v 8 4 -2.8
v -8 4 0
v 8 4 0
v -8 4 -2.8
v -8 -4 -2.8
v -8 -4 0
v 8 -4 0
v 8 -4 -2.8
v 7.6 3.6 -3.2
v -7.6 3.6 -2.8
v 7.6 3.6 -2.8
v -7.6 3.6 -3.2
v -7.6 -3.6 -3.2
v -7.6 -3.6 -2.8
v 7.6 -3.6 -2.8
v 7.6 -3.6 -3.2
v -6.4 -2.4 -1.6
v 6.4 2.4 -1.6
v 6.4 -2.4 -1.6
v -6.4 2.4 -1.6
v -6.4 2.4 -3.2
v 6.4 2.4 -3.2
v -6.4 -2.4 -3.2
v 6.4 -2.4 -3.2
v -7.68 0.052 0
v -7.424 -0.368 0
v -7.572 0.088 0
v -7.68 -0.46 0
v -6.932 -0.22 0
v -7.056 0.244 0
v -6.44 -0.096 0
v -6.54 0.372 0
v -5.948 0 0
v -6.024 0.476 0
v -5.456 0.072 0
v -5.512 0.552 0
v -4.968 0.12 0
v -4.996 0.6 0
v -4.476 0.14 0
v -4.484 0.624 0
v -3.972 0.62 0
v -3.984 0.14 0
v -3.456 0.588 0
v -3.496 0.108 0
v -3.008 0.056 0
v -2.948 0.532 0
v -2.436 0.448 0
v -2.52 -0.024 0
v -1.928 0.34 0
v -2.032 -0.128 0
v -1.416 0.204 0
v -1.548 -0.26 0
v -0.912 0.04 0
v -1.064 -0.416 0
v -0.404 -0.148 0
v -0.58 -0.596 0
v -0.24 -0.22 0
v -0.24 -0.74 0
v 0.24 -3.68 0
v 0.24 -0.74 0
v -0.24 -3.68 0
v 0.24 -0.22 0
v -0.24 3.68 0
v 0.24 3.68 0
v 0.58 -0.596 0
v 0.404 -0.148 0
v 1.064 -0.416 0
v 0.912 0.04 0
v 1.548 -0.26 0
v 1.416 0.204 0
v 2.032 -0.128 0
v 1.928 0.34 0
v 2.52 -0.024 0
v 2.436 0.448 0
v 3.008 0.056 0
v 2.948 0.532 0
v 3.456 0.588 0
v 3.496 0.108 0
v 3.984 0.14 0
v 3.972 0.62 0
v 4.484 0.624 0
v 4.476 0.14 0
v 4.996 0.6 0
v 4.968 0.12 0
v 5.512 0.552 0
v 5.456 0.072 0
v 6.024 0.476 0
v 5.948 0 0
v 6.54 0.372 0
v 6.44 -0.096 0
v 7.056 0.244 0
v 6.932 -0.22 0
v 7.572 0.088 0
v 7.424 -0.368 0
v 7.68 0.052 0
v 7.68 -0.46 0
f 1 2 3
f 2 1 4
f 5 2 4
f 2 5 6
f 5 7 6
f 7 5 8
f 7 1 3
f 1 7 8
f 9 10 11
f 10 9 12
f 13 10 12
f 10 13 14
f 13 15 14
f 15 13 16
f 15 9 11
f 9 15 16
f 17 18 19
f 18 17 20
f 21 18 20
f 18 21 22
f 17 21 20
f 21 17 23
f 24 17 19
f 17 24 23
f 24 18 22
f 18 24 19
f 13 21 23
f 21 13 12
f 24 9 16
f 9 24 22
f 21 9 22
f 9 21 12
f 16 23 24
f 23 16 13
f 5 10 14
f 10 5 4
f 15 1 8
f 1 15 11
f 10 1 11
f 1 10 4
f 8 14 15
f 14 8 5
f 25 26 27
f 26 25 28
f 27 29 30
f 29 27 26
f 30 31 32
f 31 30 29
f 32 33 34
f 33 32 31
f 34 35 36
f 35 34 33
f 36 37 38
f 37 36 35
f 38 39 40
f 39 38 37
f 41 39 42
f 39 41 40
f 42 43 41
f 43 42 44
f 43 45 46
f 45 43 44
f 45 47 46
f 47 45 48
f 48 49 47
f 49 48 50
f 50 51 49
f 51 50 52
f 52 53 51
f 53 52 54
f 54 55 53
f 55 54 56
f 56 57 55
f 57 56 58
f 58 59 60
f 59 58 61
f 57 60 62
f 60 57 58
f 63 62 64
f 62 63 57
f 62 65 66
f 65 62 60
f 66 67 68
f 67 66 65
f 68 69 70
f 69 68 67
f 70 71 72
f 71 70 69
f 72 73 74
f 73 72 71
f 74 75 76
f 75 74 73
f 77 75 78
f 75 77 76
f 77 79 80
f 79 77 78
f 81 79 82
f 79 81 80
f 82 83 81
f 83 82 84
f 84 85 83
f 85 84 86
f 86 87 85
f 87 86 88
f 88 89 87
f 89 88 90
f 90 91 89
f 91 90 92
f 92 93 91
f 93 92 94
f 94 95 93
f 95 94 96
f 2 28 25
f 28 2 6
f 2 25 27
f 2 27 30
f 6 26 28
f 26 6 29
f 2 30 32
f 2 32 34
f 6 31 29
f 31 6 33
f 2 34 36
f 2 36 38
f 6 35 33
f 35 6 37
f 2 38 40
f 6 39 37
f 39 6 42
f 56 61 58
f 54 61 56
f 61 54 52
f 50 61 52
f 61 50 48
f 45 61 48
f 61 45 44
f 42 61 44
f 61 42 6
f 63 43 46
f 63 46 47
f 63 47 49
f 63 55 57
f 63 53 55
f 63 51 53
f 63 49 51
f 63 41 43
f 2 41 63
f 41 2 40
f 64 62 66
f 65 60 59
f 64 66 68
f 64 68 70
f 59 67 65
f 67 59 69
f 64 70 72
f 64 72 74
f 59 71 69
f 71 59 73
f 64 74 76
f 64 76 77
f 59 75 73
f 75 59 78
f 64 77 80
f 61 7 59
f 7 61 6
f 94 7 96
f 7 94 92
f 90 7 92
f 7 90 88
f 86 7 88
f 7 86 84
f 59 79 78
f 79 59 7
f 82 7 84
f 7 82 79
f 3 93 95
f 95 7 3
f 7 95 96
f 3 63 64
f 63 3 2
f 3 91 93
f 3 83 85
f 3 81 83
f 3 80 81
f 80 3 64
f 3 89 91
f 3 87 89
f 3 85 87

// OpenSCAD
// file: ../p/box5.scad
use <../lib.scad>
function ldraw_lib__box5() = [
// 0 Box with 5 Faces and All Edges
// 0 Name: box5.dat
// 0 Author: James Jessiman
// 0 !LDRAW_ORG Primitive UPDATE 2012-01
// 0 !LICENSE Licensed under CC BY 2.0 and CC BY 4.0 : see CAreadme.txt
// 
// 0 BFC CERTIFY CCW
  [0,"BFC","CERTIFY"],
  [0,"BFC","CCW"],
// 
// 0 !HISTORY 2002-04-03 [sbliss] Modified for BFC compliance
// 0 !HISTORY 2002-04-25 [PTadmin] Official Update 2002-02
// 0 !HISTORY 2007-06-24 [PTadmin] Header formatted for Contributor Agreement
// 0 !HISTORY 2008-07-01 [PTadmin] Official Update 2008-01
// 0 !HISTORY 2012-02-16 [Philo] Changed to CCW
// 0 !HISTORY 2012-03-30 [PTadmin] Official Update 2012-01
// 
// 
// 2 24 1 1 1 -1 1 1
  [2,24,1,1,1,-1,1,1],
// 2 24 -1 1 1 -1 1 -1
  [2,24,-1,1,1,-1,1,-1],
// 2 24 -1 1 -1 1 1 -1
  [2,24,-1,1,-1,1,1,-1],
// 2 24 1 1 -1 1 1 1
  [2,24,1,1,-1,1,1,1],
// 2 24 1 0 1 -1 0 1
  [2,24,1,0,1,-1,0,1],
// 2 24 -1 0 1 -1 0 -1
  [2,24,-1,0,1,-1,0,-1],
// 2 24 -1 0 -1 1 0 -1
  [2,24,-1,0,-1,1,0,-1],
// 2 24 1 0 -1 1 0 1
  [2,24,1,0,-1,1,0,1],
// 2 24 1 0 1 1 1 1
  [2,24,1,0,1,1,1,1],
// 2 24 -1 0 1 -1 1 1
  [2,24,-1,0,1,-1,1,1],
// 2 24 1 0 -1 1 1 -1
  [2,24,1,0,-1,1,1,-1],
// 2 24 -1 0 -1 -1 1 -1
  [2,24,-1,0,-1,-1,1,-1],
// 4 16 -1 1 1 1 1 1 1 1 -1 -1 1 -1
  [4,16,-1,1,1,1,1,1,1,1,-1,-1,1,-1],
// 4 16 -1 1 1 -1 0 1 1 0 1 1 1 1
  [4,16,-1,1,1,-1,0,1,1,0,1,1,1,1],
// 4 16 -1 1 -1 -1 0 -1 -1 0 1 -1 1 1
  [4,16,-1,1,-1,-1,0,-1,-1,0,1,-1,1,1],
// 4 16 1 1 -1 1 0 -1 -1 0 -1 -1 1 -1
  [4,16,1,1,-1,1,0,-1,-1,0,-1,-1,1,-1],
// 4 16 1 1 1 1 0 1 1 0 -1 1 1 -1
  [4,16,1,1,1,1,0,1,1,0,-1,1,1,-1],
];
makepoly(ldraw_lib__box5(), line=0.2);
// file: ../p/box4.scad
use <../lib.scad>
function ldraw_lib__box4() = [
// 0 Box with 4 Faces (2 Parallel Pairs) and All Edges
// 0 Name: box4.dat
// 0 Author: James Jessiman
// 0 !LDRAW_ORG Primitive UPDATE 2012-01
// 0 !LICENSE Licensed under CC BY 2.0 and CC BY 4.0 : see CAreadme.txt
// 
// 0 BFC CERTIFY CCW
  [0,"BFC","CERTIFY"],
  [0,"BFC","CCW"],
// 
// 0 !HISTORY 2002-04-03 [sbliss] Modified for BFC compliance
// 0 !HISTORY 2002-04-25 [PTadmin] Official Update 2002-02
// 0 !HISTORY 2007-06-24 [PTadmin] Header formatted for Contributor Agreement
// 0 !HISTORY 2008-07-01 [PTadmin] Official Update 2008-01
// 0 !HISTORY 2012-02-16 [Philo] Changed to CCW
// 0 !HISTORY 2012-03-30 [PTadmin] Official Update 2012-01
// 
// 
// 2 24 1 1 1 -1 1 1
  [2,24,1,1,1,-1,1,1],
// 2 24 -1 1 1 -1 1 -1
  [2,24,-1,1,1,-1,1,-1],
// 2 24 -1 1 -1 1 1 -1
  [2,24,-1,1,-1,1,1,-1],
// 2 24 1 1 -1 1 1 1
  [2,24,1,1,-1,1,1,1],
// 2 24 1 0 1 -1 0 1
  [2,24,1,0,1,-1,0,1],
// 2 24 -1 0 1 -1 0 -1
  [2,24,-1,0,1,-1,0,-1],
// 2 24 -1 0 -1 1 0 -1
  [2,24,-1,0,-1,1,0,-1],
// 2 24 1 0 -1 1 0 1
  [2,24,1,0,-1,1,0,1],
// 2 24 1 0 1 1 1 1
  [2,24,1,0,1,1,1,1],
// 2 24 -1 0 1 -1 1 1
  [2,24,-1,0,1,-1,1,1],
// 2 24 1 0 -1 1 1 -1
  [2,24,1,0,-1,1,1,-1],
// 2 24 -1 0 -1 -1 1 -1
  [2,24,-1,0,-1,-1,1,-1],
// 4 16 -1 1 1 -1 0 1 1 0 1 1 1 1
  [4,16,-1,1,1,-1,0,1,1,0,1,1,1,1],
// 4 16 -1 1 -1 -1 0 -1 -1 0 1 -1 1 1
  [4,16,-1,1,-1,-1,0,-1,-1,0,1,-1,1,1],
// 4 16 1 1 -1 1 0 -1 -1 0 -1 -1 1 -1
  [4,16,1,1,-1,1,0,-1,-1,0,-1,-1,1,-1],
// 4 16 1 1 1 1 0 1 1 0 -1 1 1 -1
  [4,16,1,1,1,1,0,1,1,0,-1,1,1,-1],
];
makepoly(ldraw_lib__box4(), line=0.2);
// file: s/3069bs01.scad
use <../../lib.scad>
use <../../p/box4.scad>
use <../../p/box5.scad>
function ldraw_lib__s__3069bs01() = [
// 0 ~Tile  1 x  2 with Groove without Top Face
// 0 Name: s\3069bs01.dat
// 0 Author: Santeri Piippo [arezey]
// 0 !LDRAW_ORG Subpart UPDATE 2010-02
// 0 !LICENSE Licensed under CC BY 2.0 and CC BY 4.0 : see CAreadme.txt
// 
// 0 BFC CERTIFY CCW
  [0,"BFC","CERTIFY"],
  [0,"BFC","CCW"],
// 
// 0 !HISTORY 2010-07-05 [PTadmin] Official Update 2010-02
// 
// 
// 1 16 0 0 0 20 0 0 0 7 0 0 0 10 box4.dat
  [1,16,0,0,0,20,0,0,0,7,0,0,0,10, ldraw_lib__box4()],
// 1 16 0 7 0 19 0 0 0 1 0 0 0 9 box4.dat
  [1,16,0,7,0,19,0,0,0,1,0,0,0,9, ldraw_lib__box4()],
// 0 BFC INVERTNEXT
  [0,"BFC","INVERTNEXT"],
// 1 16 0 8 0 16 0 0 0 -4 0 0 0 6 box5.dat
  [1,16,0,8,0,16,0,0,0,-4,0,0,0,6, ldraw_lib__box5()],
// 4 16 -19 8 9 -16 8 6 -16 8 -6 -19 8 -9
  [4,16,-19,8,9,-16,8,6,-16,8,-6,-19,8,-9],
// 4 16 19 8 -9 16 8 -6 16 8 6 19 8 9
  [4,16,19,8,-9,16,8,-6,16,8,6,19,8,9],
// 4 16 19 8 9 16 8 6 -16 8 6 -19 8 9
  [4,16,19,8,9,16,8,6,-16,8,6,-19,8,9],
// 4 16 -19 8 -9 -16 8 -6 16 8 -6 19 8 -9
  [4,16,-19,8,-9,-16,8,-6,16,8,-6,19,8,-9],
// 4 16 -20 7 10 -19 7 9 -19 7 -9 -20 7 -10
  [4,16,-20,7,10,-19,7,9,-19,7,-9,-20,7,-10],
// 4 16 20 7 -10 19 7 -9 19 7 9 20 7 10
  [4,16,20,7,-10,19,7,-9,19,7,9,20,7,10],
// 4 16 20 7 10 19 7 9 -19 7 9 -20 7 10
  [4,16,20,7,10,19,7,9,-19,7,9,-20,7,10],
// 4 16 -20 7 -10 -19 7 -9 19 7 -9 20 7 -10
  [4,16,-20,7,-10,-19,7,-9,19,7,-9,20,7,-10],
// 0 //
];
makepoly(ldraw_lib__s__3069bs01(), line=0.2);
// main file
use <../lib.scad>
use <s/3069bs01.scad>
function ldraw_lib__3069bpz9() = [
// 0 Tile  1 x  2 with Black Spider Web Pattern
// 0 Name: 3069bpz9.dat
// 0 Author: Damien Roux [Darats]
// 0 !LDRAW_ORG Part UPDATE 2019-01
// 0 !LICENSE Licensed under CC BY 2.0 and CC BY 4.0 : see CAreadme.txt
// 
// 0 BFC CERTIFY CCW
  [0,"BFC","CERTIFY"],
  [0,"BFC","CCW"],
// 
// 0 !KEYWORDS Brickheadz, Set 41497, Spider-Man
// 
// 0 !HISTORY 2019-06-28 [PTadmin] Official Update 2019-01
// 
// 
// 1 16 0 0 0 1 0 0 0 1 0 0 0 1 s\3069bs01.dat
  [1,16,0,0,0,1,0,0,0,1,0,0,0,1, ldraw_lib__s__3069bs01()],
// 4 0 -18.93 0 0.22 -19.2 0 0.13 -19.2 0 -1.15 -18.56 0 -0.92
  [4,0,-18.93,0,0.22,-19.2,0,0.13,-19.2,0,-1.15,-18.56,0,-0.92],
// 4 0 -17.64 0 0.61 -18.93 0 0.22 -18.56 0 -0.92 -17.33 0 -0.55
  [4,0,-17.64,0,0.61,-18.93,0,0.22,-18.56,0,-0.92,-17.33,0,-0.55],
// 4 0 -16.35 0 0.93 -17.64 0 0.61 -17.33 0 -0.55 -16.1 0 -0.24
  [4,0,-16.35,0,0.93,-17.64,0,0.61,-17.33,0,-0.55,-16.1,0,-0.24],
// 4 0 -15.06 0 1.19 -16.35 0 0.93 -16.1 0 -0.24 -14.87 0 0
  [4,0,-15.06,0,1.19,-16.35,0,0.93,-16.1,0,-0.24,-14.87,0,0],
// 4 0 -13.78 0 1.38 -15.06 0 1.19 -14.87 0 0 -13.64 0 0.18
  [4,0,-13.78,0,1.38,-15.06,0,1.19,-14.87,0,0,-13.64,0,0.18],
// 4 0 -12.49 0 1.5 -13.78 0 1.38 -13.64 0 0.18 -12.42 0 0.3
  [4,0,-12.49,0,1.5,-13.78,0,1.38,-13.64,0,0.18,-12.42,0,0.3],
// 4 0 -11.21 0 1.56 -12.49 0 1.5 -12.42 0 0.3 -11.19 0 0.35
  [4,0,-11.21,0,1.56,-12.49,0,1.5,-12.42,0,0.3,-11.19,0,0.35],
// 4 0 -9.93 0 1.55 -11.21 0 1.56 -11.19 0 0.35 -9.96 0 0.35
  [4,0,-9.93,0,1.55,-11.21,0,1.56,-11.19,0,0.35,-9.96,0,0.35],
// 4 0 -8.64 0 1.47 -9.93 0 1.55 -9.96 0 0.35 -8.74 0 0.27
  [4,0,-8.64,0,1.47,-9.93,0,1.55,-9.96,0,0.35,-8.74,0,0.27],
// 4 0 -7.37 0 1.33 -8.64 0 1.47 -8.74 0 0.27 -7.52 0 0.14
  [4,0,-7.37,0,1.33,-8.64,0,1.47,-8.74,0,0.27,-7.52,0,0.14],
// 4 0 -6.09 0 1.12 -7.37 0 1.33 -7.52 0 0.14 -6.3 0 -0.06
  [4,0,-6.09,0,1.12,-7.37,0,1.33,-7.52,0,0.14,-6.3,0,-0.06],
// 4 0 -4.82 0 0.85 -6.09 0 1.12 -6.3 0 -0.06 -5.08 0 -0.32
  [4,0,-4.82,0,0.85,-6.09,0,1.12,-6.3,0,-0.06,-5.08,0,-0.32],
// 4 0 -3.54 0 0.51 -4.82 0 0.85 -5.08 0 -0.32 -3.87 0 -0.65
  [4,0,-3.54,0,0.51,-4.82,0,0.85,-5.08,0,-0.32,-3.87,0,-0.65],
// 4 0 -2.28 0 0.1 -3.54 0 0.51 -3.87 0 -0.65 -2.66 0 -1.04
  [4,0,-2.28,0,0.1,-3.54,0,0.51,-3.87,0,-0.65,-2.66,0,-1.04],
// 4 0 -1.01 0 -0.37 -2.28 0 0.1 -2.66 0 -1.04 -1.45 0 -1.49
  [4,0,-1.01,0,-0.37,-2.28,0,0.1,-2.66,0,-1.04,-1.45,0,-1.49],
// 4 0 -0.6 0 -0.55 -1.01 0 -0.37 -1.45 0 -1.49 -0.6 0 -1.85
  [4,0,-0.6,0,-0.55,-1.01,0,-0.37,-1.45,0,-1.49,-0.6,0,-1.85],
// 4 0 0.6 0 -1.85 -0.6 0 -1.85 -0.6 0 -9.2 0.6 0 -9.2
  [4,0,0.6,0,-1.85,-0.6,0,-1.85,-0.6,0,-9.2,0.6,0,-9.2],
// 4 0 0.6 0 -0.55 -0.6 0 -0.55 -0.6 0 -1.85 0.6 0 -1.85
  [4,0,0.6,0,-0.55,-0.6,0,-0.55,-0.6,0,-1.85,0.6,0,-1.85],
// 4 0 0.6 0 9.2 -0.6 0 9.2 -0.6 0 -0.55 0.6 0 -0.55
  [4,0,0.6,0,9.2,-0.6,0,9.2,-0.6,0,-0.55,0.6,0,-0.55],
// 4 0 1.45 0 -1.49 1.01 0 -0.37 0.6 0 -0.55 0.6 0 -1.85
  [4,0,1.45,0,-1.49,1.01,0,-0.37,0.6,0,-0.55,0.6,0,-1.85],
// 4 0 2.66 0 -1.04 2.28 0 0.1 1.01 0 -0.37 1.45 0 -1.49
  [4,0,2.66,0,-1.04,2.28,0,0.1,1.01,0,-0.37,1.45,0,-1.49],
// 4 0 3.87 0 -0.65 3.54 0 0.51 2.28 0 0.1 2.66 0 -1.04
  [4,0,3.87,0,-0.65,3.54,0,0.51,2.28,0,0.1,2.66,0,-1.04],
// 4 0 5.08 0 -0.32 4.82 0 0.85 3.54 0 0.51 3.87 0 -0.65
  [4,0,5.08,0,-0.32,4.82,0,0.85,3.54,0,0.51,3.87,0,-0.65],
// 4 0 6.3 0 -0.06 6.09 0 1.12 4.82 0 0.85 5.08 0 -0.32
  [4,0,6.3,0,-0.06,6.09,0,1.12,4.82,0,0.85,5.08,0,-0.32],
// 4 0 7.52 0 0.14 7.37 0 1.33 6.09 0 1.12 6.3 0 -0.06
  [4,0,7.52,0,0.14,7.37,0,1.33,6.09,0,1.12,6.3,0,-0.06],
// 4 0 8.74 0 0.27 8.64 0 1.47 7.37 0 1.33 7.52 0 0.14
  [4,0,8.74,0,0.27,8.64,0,1.47,7.37,0,1.33,7.52,0,0.14],
// 4 0 9.96 0 0.35 9.93 0 1.55 8.64 0 1.47 8.74 0 0.27
  [4,0,9.96,0,0.35,9.93,0,1.55,8.64,0,1.47,8.74,0,0.27],
// 4 0 11.19 0 0.35 11.21 0 1.56 9.93 0 1.55 9.96 0 0.35
  [4,0,11.19,0,0.35,11.21,0,1.56,9.93,0,1.55,9.96,0,0.35],
// 4 0 12.42 0 0.3 12.49 0 1.5 11.21 0 1.56 11.19 0 0.35
  [4,0,12.42,0,0.3,12.49,0,1.5,11.21,0,1.56,11.19,0,0.35],
// 4 0 13.64 0 0.18 13.78 0 1.38 12.49 0 1.5 12.42 0 0.3
  [4,0,13.64,0,0.18,13.78,0,1.38,12.49,0,1.5,12.42,0,0.3],
// 4 0 14.87 0 0 15.06 0 1.19 13.78 0 1.38 13.64 0 0.18
  [4,0,14.87,0,0,15.06,0,1.19,13.78,0,1.38,13.64,0,0.18],
// 4 0 16.1 0 -0.24 16.35 0 0.93 15.06 0 1.19 14.87 0 0
  [4,0,16.1,0,-0.24,16.35,0,0.93,15.06,0,1.19,14.87,0,0],
// 4 0 17.33 0 -0.55 17.64 0 0.61 16.35 0 0.93 16.1 0 -0.24
  [4,0,17.33,0,-0.55,17.64,0,0.61,16.35,0,0.93,16.1,0,-0.24],
// 4 0 18.56 0 -0.92 18.93 0 0.22 17.64 0 0.61 17.33 0 -0.55
  [4,0,18.56,0,-0.92,18.93,0,0.22,17.64,0,0.61,17.33,0,-0.55],
// 4 0 19.2 0 -1.15 19.2 0 0.13 18.93 0 0.22 18.56 0 -0.92
  [4,0,19.2,0,-1.15,19.2,0,0.13,18.93,0,0.22,18.56,0,-0.92],
// 4 16 -19.2 0 0.13 -20 0 10 -20 0 -10 -19.2 0 -1.15
  [4,16,-19.2,0,0.13,-20,0,10,-20,0,-10,-19.2,0,-1.15],
// 3 16 -20 0 10 -19.2 0 0.13 -18.93 0 0.22
  [3,16,-20,0,10,-19.2,0,0.13,-18.93,0,0.22],
// 3 16 -20 0 10 -18.93 0 0.22 -17.64 0 0.61
  [3,16,-20,0,10,-18.93,0,0.22,-17.64,0,0.61],
// 4 16 -18.56 0 -0.92 -19.2 0 -1.15 -20 0 -10 -17.33 0 -0.55
  [4,16,-18.56,0,-0.92,-19.2,0,-1.15,-20,0,-10,-17.33,0,-0.55],
// 3 16 -20 0 10 -17.64 0 0.61 -16.35 0 0.93
  [3,16,-20,0,10,-17.64,0,0.61,-16.35,0,0.93],
// 3 16 -20 0 10 -16.35 0 0.93 -15.06 0 1.19
  [3,16,-20,0,10,-16.35,0,0.93,-15.06,0,1.19],
// 4 16 -16.1 0 -0.24 -17.33 0 -0.55 -20 0 -10 -14.87 0 0
  [4,16,-16.1,0,-0.24,-17.33,0,-0.55,-20,0,-10,-14.87,0,0],
// 3 16 -20 0 10 -15.06 0 1.19 -13.78 0 1.38
  [3,16,-20,0,10,-15.06,0,1.19,-13.78,0,1.38],
// 3 16 -20 0 10 -13.78 0 1.38 -12.49 0 1.5
  [3,16,-20,0,10,-13.78,0,1.38,-12.49,0,1.5],
// 4 16 -13.64 0 0.18 -14.87 0 0 -20 0 -10 -12.42 0 0.3
  [4,16,-13.64,0,0.18,-14.87,0,0,-20,0,-10,-12.42,0,0.3],
// 3 16 -20 0 10 -12.49 0 1.5 -11.21 0 1.56
  [3,16,-20,0,10,-12.49,0,1.5,-11.21,0,1.56],
// 4 16 -11.19 0 0.35 -12.42 0 0.3 -20 0 -10 -9.96 0 0.35
  [4,16,-11.19,0,0.35,-12.42,0,0.3,-20,0,-10,-9.96,0,0.35],
// 3 16 -1.45 0 -1.49 -0.6 0 -9.2 -0.6 0 -1.85
  [3,16,-1.45,0,-1.49,-0.6,0,-9.2,-0.6,0,-1.85],
// 4 16 -2.66 0 -1.04 -3.87 0 -0.65 -0.6 0 -9.2 -1.45 0 -1.49
  [4,16,-2.66,0,-1.04,-3.87,0,-0.65,-0.6,0,-9.2,-1.45,0,-1.49],
// 4 16 -5.08 0 -0.32 -6.3 0 -0.06 -0.6 0 -9.2 -3.87 0 -0.65
  [4,16,-5.08,0,-0.32,-6.3,0,-0.06,-0.6,0,-9.2,-3.87,0,-0.65],
// 4 16 -7.52 0 0.14 -8.74 0 0.27 -0.6 0 -9.2 -6.3 0 -0.06
  [4,16,-7.52,0,0.14,-8.74,0,0.27,-0.6,0,-9.2,-6.3,0,-0.06],
// 4 16 -9.96 0 0.35 -20 0 -10 -0.6 0 -9.2 -8.74 0 0.27
  [4,16,-9.96,0,0.35,-20,0,-10,-0.6,0,-9.2,-8.74,0,0.27],
// 3 16 -0.6 0 9.2 -8.64 0 1.47 -7.37 0 1.33
  [3,16,-0.6,0,9.2,-8.64,0,1.47,-7.37,0,1.33],
// 3 16 -0.6 0 9.2 -7.37 0 1.33 -6.09 0 1.12
  [3,16,-0.6,0,9.2,-7.37,0,1.33,-6.09,0,1.12],
// 3 16 -0.6 0 9.2 -6.09 0 1.12 -4.82 0 0.85
  [3,16,-0.6,0,9.2,-6.09,0,1.12,-4.82,0,0.85],
// 3 16 -0.6 0 9.2 -1.01 0 -0.37 -0.6 0 -0.55
  [3,16,-0.6,0,9.2,-1.01,0,-0.37,-0.6,0,-0.55],
// 3 16 -0.6 0 9.2 -2.28 0 0.1 -1.01 0 -0.37
  [3,16,-0.6,0,9.2,-2.28,0,0.1,-1.01,0,-0.37],
// 3 16 -0.6 0 9.2 -3.54 0 0.51 -2.28 0 0.1
  [3,16,-0.6,0,9.2,-3.54,0,0.51,-2.28,0,0.1],
// 3 16 -0.6 0 9.2 -4.82 0 0.85 -3.54 0 0.51
  [3,16,-0.6,0,9.2,-4.82,0,0.85,-3.54,0,0.51],
// 3 16 -0.6 0 9.2 -9.93 0 1.55 -8.64 0 1.47
  [3,16,-0.6,0,9.2,-9.93,0,1.55,-8.64,0,1.47],
// 4 16 -20 0 10 -11.21 0 1.56 -9.93 0 1.55 -0.6 0 9.2
  [4,16,-20,0,10,-11.21,0,1.56,-9.93,0,1.55,-0.6,0,9.2],
// 3 16 0.6 0 9.2 0.6 0 -0.55 1.01 0 -0.37
  [3,16,0.6,0,9.2,0.6,0,-0.55,1.01,0,-0.37],
// 3 16 1.45 0 -1.49 0.6 0 -1.85 0.6 0 -9.2
  [3,16,1.45,0,-1.49,0.6,0,-1.85,0.6,0,-9.2],
// 3 16 0.6 0 9.2 1.01 0 -0.37 2.28 0 0.1
  [3,16,0.6,0,9.2,1.01,0,-0.37,2.28,0,0.1],
// 3 16 0.6 0 9.2 2.28 0 0.1 3.54 0 0.51
  [3,16,0.6,0,9.2,2.28,0,0.1,3.54,0,0.51],
// 4 16 0.6 0 -9.2 3.87 0 -0.65 2.66 0 -1.04 1.45 0 -1.49
  [4,16,0.6,0,-9.2,3.87,0,-0.65,2.66,0,-1.04,1.45,0,-1.49],
// 3 16 0.6 0 9.2 3.54 0 0.51 4.82 0 0.85
  [3,16,0.6,0,9.2,3.54,0,0.51,4.82,0,0.85],
// 3 16 0.6 0 9.2 4.82 0 0.85 6.09 0 1.12
  [3,16,0.6,0,9.2,4.82,0,0.85,6.09,0,1.12],
// 4 16 0.6 0 -9.2 6.3 0 -0.06 5.08 0 -0.32 3.87 0 -0.65
  [4,16,0.6,0,-9.2,6.3,0,-0.06,5.08,0,-0.32,3.87,0,-0.65],
// 3 16 0.6 0 9.2 6.09 0 1.12 7.37 0 1.33
  [3,16,0.6,0,9.2,6.09,0,1.12,7.37,0,1.33],
// 3 16 0.6 0 9.2 7.37 0 1.33 8.64 0 1.47
  [3,16,0.6,0,9.2,7.37,0,1.33,8.64,0,1.47],
// 4 16 0.6 0 -9.2 8.74 0 0.27 7.52 0 0.14 6.3 0 -0.06
  [4,16,0.6,0,-9.2,8.74,0,0.27,7.52,0,0.14,6.3,0,-0.06],
// 3 16 0.6 0 9.2 8.64 0 1.47 9.93 0 1.55
  [3,16,0.6,0,9.2,8.64,0,1.47,9.93,0,1.55],
// 4 16 0.6 0 -9.2 -0.6 0 -9.2 -20 0 -10 20 0 -10
  [4,16,0.6,0,-9.2,-0.6,0,-9.2,-20,0,-10,20,0,-10],
// 4 16 20 0 -10 19.2 0 -1.15 18.56 0 -0.92 17.33 0 -0.55
  [4,16,20,0,-10,19.2,0,-1.15,18.56,0,-0.92,17.33,0,-0.55],
// 4 16 20 0 -10 17.33 0 -0.55 16.1 0 -0.24 14.87 0 0
  [4,16,20,0,-10,17.33,0,-0.55,16.1,0,-0.24,14.87,0,0],
// 4 16 20 0 -10 14.87 0 0 13.64 0 0.18 12.42 0 0.3
  [4,16,20,0,-10,14.87,0,0,13.64,0,0.18,12.42,0,0.3],
// 4 16 0.6 0 -9.2 20 0 -10 9.96 0 0.35 8.74 0 0.27
  [4,16,0.6,0,-9.2,20,0,-10,9.96,0,0.35,8.74,0,0.27],
// 4 16 20 0 -10 12.42 0 0.3 11.19 0 0.35 9.96 0 0.35
  [4,16,20,0,-10,12.42,0,0.3,11.19,0,0.35,9.96,0,0.35],
// 3 16 20 0 10 18.93 0 0.22 19.2 0 0.13
  [3,16,20,0,10,18.93,0,0.22,19.2,0,0.13],
// 4 16 20 0 -10 20 0 10 19.2 0 0.13 19.2 0 -1.15
  [4,16,20,0,-10,20,0,10,19.2,0,0.13,19.2,0,-1.15],
// 4 16 -20 0 10 -0.6 0 9.2 0.6 0 9.2 20 0 10
  [4,16,-20,0,10,-0.6,0,9.2,0.6,0,9.2,20,0,10],
// 3 16 20 0 10 17.64 0 0.61 18.93 0 0.22
  [3,16,20,0,10,17.64,0,0.61,18.93,0,0.22],
// 3 16 20 0 10 12.49 0 1.5 13.78 0 1.38
  [3,16,20,0,10,12.49,0,1.5,13.78,0,1.38],
// 3 16 20 0 10 11.21 0 1.56 12.49 0 1.5
  [3,16,20,0,10,11.21,0,1.56,12.49,0,1.5],
// 4 16 9.93 0 1.55 11.21 0 1.56 20 0 10 0.6 0 9.2
  [4,16,9.93,0,1.55,11.21,0,1.56,20,0,10,0.6,0,9.2],
// 3 16 20 0 10 16.35 0 0.93 17.64 0 0.61
  [3,16,20,0,10,16.35,0,0.93,17.64,0,0.61],
// 3 16 20 0 10 15.06 0 1.19 16.35 0 0.93
  [3,16,20,0,10,15.06,0,1.19,16.35,0,0.93],
// 3 16 20 0 10 13.78 0 1.38 15.06 0 1.19
  [3,16,20,0,10,13.78,0,1.38,15.06,0,1.19],
];
makepoly(ldraw_lib__3069bpz9(), line=0.2);
